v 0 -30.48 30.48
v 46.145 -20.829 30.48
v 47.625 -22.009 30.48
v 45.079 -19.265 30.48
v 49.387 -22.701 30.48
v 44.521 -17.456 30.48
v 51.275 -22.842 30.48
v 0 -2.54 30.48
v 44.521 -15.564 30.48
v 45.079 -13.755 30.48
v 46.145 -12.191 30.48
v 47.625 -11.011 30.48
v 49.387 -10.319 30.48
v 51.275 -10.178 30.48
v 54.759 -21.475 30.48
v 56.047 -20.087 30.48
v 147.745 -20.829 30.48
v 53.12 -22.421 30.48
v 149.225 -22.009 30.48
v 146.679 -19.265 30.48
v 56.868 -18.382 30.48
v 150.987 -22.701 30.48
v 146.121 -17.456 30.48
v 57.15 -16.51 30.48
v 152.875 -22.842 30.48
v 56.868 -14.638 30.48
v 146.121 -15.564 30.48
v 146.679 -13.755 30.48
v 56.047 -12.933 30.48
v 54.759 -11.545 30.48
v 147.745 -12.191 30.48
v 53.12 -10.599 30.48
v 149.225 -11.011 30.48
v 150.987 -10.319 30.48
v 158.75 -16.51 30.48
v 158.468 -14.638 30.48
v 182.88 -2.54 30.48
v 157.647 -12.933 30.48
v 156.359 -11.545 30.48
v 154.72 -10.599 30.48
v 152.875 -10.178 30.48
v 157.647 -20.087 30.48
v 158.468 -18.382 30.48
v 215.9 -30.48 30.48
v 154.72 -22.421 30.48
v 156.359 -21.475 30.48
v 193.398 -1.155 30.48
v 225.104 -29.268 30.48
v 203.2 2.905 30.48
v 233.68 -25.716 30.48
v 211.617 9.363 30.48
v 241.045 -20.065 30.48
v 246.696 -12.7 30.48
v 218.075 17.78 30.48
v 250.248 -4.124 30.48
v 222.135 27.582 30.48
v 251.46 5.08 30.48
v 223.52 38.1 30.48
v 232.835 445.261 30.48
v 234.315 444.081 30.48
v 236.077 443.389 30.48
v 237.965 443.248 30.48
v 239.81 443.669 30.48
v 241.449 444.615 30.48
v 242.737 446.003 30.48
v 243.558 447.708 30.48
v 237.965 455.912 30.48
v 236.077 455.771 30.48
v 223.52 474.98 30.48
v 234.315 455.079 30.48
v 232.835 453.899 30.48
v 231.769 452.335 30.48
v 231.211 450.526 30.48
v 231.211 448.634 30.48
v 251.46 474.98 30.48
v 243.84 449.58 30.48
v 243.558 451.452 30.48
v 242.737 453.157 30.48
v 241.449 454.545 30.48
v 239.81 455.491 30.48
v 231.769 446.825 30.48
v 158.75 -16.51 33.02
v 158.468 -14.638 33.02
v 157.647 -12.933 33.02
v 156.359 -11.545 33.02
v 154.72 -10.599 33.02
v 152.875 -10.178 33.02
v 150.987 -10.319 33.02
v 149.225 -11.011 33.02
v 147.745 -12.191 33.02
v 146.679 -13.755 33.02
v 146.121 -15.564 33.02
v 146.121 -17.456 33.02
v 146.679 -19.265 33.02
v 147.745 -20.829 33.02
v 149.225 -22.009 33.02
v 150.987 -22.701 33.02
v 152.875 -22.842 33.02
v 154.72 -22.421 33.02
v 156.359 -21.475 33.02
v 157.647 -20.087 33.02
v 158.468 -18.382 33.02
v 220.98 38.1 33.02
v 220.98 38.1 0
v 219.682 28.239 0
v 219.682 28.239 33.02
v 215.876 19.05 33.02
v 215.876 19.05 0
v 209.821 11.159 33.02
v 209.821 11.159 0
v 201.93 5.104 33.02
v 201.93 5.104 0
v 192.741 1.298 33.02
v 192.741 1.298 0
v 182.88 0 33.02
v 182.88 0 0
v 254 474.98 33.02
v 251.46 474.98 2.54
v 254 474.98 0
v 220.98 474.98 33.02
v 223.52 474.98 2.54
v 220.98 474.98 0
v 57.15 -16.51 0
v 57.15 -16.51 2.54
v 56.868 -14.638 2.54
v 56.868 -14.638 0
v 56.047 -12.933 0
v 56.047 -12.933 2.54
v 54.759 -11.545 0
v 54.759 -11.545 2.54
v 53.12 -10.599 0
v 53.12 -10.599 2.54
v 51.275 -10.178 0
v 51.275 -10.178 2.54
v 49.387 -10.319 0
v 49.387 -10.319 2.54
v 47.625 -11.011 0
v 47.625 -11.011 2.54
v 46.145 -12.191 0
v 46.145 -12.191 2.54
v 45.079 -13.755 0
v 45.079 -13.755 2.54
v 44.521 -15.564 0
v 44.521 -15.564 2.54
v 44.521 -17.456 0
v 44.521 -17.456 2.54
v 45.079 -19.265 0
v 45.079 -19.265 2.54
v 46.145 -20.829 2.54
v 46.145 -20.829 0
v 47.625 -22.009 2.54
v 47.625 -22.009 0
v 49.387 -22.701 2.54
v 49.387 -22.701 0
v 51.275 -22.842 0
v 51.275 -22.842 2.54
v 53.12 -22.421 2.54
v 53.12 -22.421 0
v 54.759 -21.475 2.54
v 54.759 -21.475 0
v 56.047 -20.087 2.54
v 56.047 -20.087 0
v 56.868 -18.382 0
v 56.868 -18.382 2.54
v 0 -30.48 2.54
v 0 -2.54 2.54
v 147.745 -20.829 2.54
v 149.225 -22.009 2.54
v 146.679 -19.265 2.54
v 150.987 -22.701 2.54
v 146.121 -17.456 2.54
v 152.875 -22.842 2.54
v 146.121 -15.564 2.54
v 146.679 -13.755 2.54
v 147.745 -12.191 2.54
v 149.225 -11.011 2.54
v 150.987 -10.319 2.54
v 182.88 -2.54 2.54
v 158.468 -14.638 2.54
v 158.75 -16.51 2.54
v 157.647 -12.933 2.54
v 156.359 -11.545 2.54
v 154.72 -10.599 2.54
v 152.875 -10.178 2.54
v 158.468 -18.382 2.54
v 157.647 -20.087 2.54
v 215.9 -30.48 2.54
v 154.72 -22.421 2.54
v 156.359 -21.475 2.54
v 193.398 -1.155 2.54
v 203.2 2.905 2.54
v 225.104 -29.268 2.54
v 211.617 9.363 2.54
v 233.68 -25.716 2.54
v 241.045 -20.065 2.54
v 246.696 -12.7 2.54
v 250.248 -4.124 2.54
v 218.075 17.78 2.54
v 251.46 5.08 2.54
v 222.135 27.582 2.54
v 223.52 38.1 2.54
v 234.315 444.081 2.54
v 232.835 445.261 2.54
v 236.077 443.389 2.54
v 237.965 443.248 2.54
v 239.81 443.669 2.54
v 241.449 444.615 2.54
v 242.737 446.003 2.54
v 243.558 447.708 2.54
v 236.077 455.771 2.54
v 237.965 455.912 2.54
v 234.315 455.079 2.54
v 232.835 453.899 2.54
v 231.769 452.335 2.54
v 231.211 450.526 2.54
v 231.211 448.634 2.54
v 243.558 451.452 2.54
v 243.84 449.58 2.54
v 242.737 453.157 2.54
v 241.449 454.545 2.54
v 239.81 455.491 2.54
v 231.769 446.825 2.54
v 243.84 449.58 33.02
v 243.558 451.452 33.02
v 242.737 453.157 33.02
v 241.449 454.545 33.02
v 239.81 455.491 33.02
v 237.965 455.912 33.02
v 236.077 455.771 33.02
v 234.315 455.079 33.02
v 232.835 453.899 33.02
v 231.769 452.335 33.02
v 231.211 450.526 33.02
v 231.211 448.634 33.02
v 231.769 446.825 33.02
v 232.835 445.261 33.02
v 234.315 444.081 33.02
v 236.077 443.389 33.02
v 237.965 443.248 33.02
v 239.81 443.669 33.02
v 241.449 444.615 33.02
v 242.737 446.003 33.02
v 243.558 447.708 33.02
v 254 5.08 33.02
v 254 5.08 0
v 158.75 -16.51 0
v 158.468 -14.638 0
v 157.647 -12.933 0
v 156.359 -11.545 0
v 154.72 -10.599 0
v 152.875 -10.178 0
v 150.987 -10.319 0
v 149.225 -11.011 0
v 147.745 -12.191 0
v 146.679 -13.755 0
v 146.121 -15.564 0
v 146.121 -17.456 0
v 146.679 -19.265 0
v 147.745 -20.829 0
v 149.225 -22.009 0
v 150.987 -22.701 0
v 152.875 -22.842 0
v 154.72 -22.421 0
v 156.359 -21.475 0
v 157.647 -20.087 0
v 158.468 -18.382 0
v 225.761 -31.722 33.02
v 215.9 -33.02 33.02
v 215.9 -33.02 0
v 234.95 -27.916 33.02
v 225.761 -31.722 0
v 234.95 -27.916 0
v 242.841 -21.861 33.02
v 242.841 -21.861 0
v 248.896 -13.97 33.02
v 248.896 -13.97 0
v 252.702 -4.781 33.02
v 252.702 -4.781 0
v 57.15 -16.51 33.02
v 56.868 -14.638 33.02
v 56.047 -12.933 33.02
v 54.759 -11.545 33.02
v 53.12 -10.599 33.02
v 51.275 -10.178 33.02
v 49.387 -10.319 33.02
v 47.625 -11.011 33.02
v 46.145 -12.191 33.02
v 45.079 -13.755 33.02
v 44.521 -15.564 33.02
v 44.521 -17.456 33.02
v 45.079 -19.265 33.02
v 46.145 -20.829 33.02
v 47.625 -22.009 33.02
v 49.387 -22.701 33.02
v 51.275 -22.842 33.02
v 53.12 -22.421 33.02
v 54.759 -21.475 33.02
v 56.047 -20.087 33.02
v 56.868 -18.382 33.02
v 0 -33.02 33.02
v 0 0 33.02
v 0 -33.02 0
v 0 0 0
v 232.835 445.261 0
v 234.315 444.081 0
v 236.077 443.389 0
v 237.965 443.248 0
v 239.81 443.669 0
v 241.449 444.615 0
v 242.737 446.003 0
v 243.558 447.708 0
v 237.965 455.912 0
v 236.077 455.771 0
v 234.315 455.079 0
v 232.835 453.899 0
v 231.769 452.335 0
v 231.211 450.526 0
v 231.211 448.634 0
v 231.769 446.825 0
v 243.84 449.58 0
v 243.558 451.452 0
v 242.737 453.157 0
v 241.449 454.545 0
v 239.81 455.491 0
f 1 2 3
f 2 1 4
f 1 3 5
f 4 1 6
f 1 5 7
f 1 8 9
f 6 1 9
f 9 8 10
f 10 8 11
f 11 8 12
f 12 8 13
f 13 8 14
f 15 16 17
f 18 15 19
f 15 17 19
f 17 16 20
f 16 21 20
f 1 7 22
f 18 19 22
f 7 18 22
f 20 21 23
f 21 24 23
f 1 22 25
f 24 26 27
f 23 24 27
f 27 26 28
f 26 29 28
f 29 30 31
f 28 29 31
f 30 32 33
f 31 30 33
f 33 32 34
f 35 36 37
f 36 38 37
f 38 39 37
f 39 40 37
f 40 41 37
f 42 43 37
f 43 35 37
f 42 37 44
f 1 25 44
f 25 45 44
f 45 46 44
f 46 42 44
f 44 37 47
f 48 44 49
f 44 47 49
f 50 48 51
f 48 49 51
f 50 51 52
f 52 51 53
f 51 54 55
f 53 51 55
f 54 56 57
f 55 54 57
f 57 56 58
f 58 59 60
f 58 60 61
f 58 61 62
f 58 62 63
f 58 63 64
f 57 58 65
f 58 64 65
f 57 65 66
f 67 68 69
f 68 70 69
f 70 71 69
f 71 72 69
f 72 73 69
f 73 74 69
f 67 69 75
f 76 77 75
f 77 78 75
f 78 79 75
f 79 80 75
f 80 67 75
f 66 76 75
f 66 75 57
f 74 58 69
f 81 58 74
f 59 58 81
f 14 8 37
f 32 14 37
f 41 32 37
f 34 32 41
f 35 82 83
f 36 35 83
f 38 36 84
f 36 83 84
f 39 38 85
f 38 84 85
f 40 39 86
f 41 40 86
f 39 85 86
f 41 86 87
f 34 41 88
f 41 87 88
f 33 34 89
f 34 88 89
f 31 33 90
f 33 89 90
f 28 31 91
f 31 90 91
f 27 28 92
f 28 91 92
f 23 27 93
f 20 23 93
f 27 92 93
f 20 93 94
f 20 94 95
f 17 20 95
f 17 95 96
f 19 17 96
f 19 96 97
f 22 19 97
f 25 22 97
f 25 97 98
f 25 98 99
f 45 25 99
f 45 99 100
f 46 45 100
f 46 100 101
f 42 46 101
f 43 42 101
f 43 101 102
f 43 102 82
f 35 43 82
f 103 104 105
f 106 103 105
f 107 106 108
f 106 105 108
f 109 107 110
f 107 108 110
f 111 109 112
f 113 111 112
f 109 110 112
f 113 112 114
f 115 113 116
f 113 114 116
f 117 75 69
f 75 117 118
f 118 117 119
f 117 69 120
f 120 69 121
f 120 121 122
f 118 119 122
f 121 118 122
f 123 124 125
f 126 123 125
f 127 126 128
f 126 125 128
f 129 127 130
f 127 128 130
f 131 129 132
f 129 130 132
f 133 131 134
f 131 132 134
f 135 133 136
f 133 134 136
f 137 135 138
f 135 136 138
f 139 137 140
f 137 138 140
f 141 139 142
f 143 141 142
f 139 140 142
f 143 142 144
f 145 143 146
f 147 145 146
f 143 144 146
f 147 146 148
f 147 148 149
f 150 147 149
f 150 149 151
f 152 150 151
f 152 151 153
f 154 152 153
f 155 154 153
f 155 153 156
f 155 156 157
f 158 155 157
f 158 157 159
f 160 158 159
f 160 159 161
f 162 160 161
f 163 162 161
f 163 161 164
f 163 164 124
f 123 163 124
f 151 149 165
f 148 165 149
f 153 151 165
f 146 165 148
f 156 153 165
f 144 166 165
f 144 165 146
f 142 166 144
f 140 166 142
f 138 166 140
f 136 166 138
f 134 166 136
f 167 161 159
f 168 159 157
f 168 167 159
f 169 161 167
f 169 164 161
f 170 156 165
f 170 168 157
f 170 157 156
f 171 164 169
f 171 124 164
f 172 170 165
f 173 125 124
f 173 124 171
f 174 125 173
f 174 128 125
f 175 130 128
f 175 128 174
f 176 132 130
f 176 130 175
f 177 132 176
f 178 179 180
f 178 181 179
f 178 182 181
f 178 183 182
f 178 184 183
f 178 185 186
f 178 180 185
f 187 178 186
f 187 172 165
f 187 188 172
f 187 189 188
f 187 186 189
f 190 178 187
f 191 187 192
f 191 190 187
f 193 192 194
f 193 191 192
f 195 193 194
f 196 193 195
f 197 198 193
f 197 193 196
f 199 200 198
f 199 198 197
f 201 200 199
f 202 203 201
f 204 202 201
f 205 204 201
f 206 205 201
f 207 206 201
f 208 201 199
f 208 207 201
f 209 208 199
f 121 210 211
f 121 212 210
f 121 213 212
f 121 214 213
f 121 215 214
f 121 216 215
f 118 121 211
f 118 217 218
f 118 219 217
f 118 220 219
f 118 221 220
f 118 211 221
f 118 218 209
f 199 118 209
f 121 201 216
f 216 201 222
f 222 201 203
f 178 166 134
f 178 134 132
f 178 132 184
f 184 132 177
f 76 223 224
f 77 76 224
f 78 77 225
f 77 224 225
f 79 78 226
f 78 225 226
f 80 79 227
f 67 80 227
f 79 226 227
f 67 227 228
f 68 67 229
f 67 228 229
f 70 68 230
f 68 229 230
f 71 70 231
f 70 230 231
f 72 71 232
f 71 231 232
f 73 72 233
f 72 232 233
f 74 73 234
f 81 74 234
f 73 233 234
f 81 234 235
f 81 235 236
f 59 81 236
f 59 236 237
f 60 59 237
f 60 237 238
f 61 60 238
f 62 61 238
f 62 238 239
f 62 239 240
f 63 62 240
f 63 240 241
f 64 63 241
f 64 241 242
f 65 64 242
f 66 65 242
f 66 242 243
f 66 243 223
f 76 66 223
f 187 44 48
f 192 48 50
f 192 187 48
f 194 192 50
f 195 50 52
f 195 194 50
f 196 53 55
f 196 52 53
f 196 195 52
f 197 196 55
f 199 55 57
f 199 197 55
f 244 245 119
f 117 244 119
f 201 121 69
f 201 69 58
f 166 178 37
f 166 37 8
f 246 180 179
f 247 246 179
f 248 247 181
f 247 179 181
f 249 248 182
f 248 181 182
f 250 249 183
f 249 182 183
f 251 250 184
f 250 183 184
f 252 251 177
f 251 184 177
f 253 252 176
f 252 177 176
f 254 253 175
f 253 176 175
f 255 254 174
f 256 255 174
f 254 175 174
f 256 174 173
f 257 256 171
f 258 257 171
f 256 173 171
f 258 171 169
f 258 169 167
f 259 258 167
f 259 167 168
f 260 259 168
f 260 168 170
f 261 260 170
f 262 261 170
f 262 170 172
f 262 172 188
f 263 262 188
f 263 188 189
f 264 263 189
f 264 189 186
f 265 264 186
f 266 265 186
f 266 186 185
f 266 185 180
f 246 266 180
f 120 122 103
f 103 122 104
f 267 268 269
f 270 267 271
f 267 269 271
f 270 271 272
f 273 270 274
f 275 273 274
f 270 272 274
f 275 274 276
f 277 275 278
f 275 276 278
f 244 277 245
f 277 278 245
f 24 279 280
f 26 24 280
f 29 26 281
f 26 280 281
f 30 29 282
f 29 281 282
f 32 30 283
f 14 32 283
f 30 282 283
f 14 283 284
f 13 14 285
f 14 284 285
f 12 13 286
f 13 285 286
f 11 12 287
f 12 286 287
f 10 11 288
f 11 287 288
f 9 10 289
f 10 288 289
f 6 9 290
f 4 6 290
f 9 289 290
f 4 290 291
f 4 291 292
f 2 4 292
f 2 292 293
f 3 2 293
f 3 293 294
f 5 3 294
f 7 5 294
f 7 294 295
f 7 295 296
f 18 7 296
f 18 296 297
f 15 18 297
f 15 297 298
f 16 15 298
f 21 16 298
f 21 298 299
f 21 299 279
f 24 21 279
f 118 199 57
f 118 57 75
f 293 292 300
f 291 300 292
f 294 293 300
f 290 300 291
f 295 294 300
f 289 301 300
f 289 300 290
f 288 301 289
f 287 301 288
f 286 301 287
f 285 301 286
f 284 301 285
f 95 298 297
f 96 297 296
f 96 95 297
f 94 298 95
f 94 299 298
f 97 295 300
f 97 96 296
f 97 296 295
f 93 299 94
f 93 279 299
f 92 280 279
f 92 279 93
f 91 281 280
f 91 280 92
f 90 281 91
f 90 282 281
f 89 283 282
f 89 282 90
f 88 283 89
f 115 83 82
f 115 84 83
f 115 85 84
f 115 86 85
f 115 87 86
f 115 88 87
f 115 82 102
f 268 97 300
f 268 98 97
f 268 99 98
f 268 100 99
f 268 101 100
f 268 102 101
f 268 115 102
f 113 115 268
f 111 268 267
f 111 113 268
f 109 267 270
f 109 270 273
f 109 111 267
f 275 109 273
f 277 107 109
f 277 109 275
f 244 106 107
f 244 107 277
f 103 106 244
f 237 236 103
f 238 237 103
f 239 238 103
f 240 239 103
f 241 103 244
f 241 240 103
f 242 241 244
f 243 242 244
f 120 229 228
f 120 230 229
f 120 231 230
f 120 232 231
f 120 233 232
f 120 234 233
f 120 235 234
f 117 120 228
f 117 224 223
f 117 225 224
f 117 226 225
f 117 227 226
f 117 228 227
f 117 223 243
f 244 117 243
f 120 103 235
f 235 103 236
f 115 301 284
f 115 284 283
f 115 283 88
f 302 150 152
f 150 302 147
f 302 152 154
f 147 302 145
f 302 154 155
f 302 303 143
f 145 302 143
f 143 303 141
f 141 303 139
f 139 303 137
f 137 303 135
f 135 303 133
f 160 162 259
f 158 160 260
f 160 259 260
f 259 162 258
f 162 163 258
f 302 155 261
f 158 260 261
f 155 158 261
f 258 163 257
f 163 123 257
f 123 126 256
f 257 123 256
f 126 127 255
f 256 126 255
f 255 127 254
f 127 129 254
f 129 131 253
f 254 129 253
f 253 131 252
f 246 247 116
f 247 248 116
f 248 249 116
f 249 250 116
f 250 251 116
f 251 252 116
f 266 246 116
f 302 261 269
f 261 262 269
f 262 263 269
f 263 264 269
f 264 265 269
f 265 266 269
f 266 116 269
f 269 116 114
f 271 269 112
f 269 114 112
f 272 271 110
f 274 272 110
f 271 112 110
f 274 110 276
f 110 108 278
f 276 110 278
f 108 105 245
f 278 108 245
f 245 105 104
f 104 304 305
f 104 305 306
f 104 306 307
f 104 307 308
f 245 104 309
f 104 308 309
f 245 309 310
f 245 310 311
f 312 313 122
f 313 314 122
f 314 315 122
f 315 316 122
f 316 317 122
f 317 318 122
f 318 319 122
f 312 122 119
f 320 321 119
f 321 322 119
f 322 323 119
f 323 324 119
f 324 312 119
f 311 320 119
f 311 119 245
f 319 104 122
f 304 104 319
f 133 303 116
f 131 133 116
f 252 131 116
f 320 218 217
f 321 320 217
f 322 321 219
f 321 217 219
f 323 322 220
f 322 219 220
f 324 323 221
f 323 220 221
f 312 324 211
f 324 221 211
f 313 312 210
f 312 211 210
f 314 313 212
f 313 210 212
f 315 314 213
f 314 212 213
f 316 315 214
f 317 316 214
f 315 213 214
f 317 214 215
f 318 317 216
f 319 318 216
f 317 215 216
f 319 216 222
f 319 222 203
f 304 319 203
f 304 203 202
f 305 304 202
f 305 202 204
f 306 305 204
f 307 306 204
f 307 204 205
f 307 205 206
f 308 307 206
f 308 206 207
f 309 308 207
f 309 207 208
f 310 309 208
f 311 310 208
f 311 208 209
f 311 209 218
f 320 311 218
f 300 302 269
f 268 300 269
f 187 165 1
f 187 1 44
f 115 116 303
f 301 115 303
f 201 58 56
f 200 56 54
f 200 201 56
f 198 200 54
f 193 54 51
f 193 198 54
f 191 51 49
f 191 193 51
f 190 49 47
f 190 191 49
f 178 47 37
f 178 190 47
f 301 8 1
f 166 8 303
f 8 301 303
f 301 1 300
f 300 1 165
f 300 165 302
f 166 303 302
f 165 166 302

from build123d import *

# Parameters (mm, degrees)
BOSS_EXTRUDE1_DEPTH = 33.02
SHELL1_T            = -2.54
CUT_EXTRUDE1_REACH  = 570.92
SKETCH2_W           = 27.94
SKETCH2_H           = 27.94
SKETCH3_R           = 6.35
CUT_EXTRUDE2_DEPTH  = 540.640918389
SKETCH4_R           = 6.35
CUT_EXTRUDE3_DEPTH  = 540.640918389


with BuildPart() as part:
    # Sketch1 → Boss-Extrude1 (new body)
    with BuildSketch(Plane.XY):
        with BuildLine():
            Line((0, 0), (0, -33.02))
            Line((0, -33.02), (215.9, -33.02))
            ThreePointArc((215.9, -33.02), (242.840768363, -21.860768363), (254, 5.08))
            Line((254, 5.08), (254, 474.98))
            Line((254, 474.98), (220.98, 474.98))
            Line((220.98, 474.98), (220.98, 38.1))
            ThreePointArc((220.98, 38.1), (209.820768363, 11.159231637), (182.88, 0))
            Line((182.88, 0), (0, 0))
        make_face()
    extrude(amount=BOSS_EXTRUDE1_DEPTH)

    # Shell1
    shell1_openings = [part.faces().sort_by_distance(p)[0] for p in [
        (0, -16.51, 16.51),
    ]]
    offset(amount=SHELL1_T, openings=shell1_openings, kind=Kind.INTERSECTION)

    # Sketch2 → Cut-Extrude1 (cut, up to next)
    with BuildSketch(Plane(origin=(0, 474.98, 0), x_dir=(1, 0, 0), z_dir=(0, 1, 0)), mode=Mode.PRIVATE) as cut_extrude1_sk1:
        with Locations((237.49, -16.51)):
            Rectangle(SKETCH2_W, SKETCH2_H)
    cut_extrude1_tool1 = extrude(cut_extrude1_sk1.sketch, amount=-CUT_EXTRUDE1_REACH, mode=Mode.PRIVATE) & part.part
    add(cut_extrude1_tool1.solids().sort_by_distance((237.49, 474.98, 16.51))[0], mode=Mode.SUBTRACT)

    # Sketch3 → Cut-Extrude2 (cut, through all)
    with BuildSketch(Plane.XY.offset(33.02)):
        with Locations((50.8, -16.51)):
            Circle(SKETCH3_R)
        with Locations((152.4, -16.51)):
            Circle(SKETCH3_R)
    extrude(amount=-CUT_EXTRUDE2_DEPTH, mode=Mode.SUBTRACT)

    # Sketch4 → Cut-Extrude3 (cut, through all)
    with BuildSketch(Plane.XY.offset(33.02)):
        with Locations((237.49, 449.58)):
            Circle(SKETCH4_R)
    extrude(amount=-CUT_EXTRUDE3_DEPTH, mode=Mode.SUBTRACT)


solid = part.part
